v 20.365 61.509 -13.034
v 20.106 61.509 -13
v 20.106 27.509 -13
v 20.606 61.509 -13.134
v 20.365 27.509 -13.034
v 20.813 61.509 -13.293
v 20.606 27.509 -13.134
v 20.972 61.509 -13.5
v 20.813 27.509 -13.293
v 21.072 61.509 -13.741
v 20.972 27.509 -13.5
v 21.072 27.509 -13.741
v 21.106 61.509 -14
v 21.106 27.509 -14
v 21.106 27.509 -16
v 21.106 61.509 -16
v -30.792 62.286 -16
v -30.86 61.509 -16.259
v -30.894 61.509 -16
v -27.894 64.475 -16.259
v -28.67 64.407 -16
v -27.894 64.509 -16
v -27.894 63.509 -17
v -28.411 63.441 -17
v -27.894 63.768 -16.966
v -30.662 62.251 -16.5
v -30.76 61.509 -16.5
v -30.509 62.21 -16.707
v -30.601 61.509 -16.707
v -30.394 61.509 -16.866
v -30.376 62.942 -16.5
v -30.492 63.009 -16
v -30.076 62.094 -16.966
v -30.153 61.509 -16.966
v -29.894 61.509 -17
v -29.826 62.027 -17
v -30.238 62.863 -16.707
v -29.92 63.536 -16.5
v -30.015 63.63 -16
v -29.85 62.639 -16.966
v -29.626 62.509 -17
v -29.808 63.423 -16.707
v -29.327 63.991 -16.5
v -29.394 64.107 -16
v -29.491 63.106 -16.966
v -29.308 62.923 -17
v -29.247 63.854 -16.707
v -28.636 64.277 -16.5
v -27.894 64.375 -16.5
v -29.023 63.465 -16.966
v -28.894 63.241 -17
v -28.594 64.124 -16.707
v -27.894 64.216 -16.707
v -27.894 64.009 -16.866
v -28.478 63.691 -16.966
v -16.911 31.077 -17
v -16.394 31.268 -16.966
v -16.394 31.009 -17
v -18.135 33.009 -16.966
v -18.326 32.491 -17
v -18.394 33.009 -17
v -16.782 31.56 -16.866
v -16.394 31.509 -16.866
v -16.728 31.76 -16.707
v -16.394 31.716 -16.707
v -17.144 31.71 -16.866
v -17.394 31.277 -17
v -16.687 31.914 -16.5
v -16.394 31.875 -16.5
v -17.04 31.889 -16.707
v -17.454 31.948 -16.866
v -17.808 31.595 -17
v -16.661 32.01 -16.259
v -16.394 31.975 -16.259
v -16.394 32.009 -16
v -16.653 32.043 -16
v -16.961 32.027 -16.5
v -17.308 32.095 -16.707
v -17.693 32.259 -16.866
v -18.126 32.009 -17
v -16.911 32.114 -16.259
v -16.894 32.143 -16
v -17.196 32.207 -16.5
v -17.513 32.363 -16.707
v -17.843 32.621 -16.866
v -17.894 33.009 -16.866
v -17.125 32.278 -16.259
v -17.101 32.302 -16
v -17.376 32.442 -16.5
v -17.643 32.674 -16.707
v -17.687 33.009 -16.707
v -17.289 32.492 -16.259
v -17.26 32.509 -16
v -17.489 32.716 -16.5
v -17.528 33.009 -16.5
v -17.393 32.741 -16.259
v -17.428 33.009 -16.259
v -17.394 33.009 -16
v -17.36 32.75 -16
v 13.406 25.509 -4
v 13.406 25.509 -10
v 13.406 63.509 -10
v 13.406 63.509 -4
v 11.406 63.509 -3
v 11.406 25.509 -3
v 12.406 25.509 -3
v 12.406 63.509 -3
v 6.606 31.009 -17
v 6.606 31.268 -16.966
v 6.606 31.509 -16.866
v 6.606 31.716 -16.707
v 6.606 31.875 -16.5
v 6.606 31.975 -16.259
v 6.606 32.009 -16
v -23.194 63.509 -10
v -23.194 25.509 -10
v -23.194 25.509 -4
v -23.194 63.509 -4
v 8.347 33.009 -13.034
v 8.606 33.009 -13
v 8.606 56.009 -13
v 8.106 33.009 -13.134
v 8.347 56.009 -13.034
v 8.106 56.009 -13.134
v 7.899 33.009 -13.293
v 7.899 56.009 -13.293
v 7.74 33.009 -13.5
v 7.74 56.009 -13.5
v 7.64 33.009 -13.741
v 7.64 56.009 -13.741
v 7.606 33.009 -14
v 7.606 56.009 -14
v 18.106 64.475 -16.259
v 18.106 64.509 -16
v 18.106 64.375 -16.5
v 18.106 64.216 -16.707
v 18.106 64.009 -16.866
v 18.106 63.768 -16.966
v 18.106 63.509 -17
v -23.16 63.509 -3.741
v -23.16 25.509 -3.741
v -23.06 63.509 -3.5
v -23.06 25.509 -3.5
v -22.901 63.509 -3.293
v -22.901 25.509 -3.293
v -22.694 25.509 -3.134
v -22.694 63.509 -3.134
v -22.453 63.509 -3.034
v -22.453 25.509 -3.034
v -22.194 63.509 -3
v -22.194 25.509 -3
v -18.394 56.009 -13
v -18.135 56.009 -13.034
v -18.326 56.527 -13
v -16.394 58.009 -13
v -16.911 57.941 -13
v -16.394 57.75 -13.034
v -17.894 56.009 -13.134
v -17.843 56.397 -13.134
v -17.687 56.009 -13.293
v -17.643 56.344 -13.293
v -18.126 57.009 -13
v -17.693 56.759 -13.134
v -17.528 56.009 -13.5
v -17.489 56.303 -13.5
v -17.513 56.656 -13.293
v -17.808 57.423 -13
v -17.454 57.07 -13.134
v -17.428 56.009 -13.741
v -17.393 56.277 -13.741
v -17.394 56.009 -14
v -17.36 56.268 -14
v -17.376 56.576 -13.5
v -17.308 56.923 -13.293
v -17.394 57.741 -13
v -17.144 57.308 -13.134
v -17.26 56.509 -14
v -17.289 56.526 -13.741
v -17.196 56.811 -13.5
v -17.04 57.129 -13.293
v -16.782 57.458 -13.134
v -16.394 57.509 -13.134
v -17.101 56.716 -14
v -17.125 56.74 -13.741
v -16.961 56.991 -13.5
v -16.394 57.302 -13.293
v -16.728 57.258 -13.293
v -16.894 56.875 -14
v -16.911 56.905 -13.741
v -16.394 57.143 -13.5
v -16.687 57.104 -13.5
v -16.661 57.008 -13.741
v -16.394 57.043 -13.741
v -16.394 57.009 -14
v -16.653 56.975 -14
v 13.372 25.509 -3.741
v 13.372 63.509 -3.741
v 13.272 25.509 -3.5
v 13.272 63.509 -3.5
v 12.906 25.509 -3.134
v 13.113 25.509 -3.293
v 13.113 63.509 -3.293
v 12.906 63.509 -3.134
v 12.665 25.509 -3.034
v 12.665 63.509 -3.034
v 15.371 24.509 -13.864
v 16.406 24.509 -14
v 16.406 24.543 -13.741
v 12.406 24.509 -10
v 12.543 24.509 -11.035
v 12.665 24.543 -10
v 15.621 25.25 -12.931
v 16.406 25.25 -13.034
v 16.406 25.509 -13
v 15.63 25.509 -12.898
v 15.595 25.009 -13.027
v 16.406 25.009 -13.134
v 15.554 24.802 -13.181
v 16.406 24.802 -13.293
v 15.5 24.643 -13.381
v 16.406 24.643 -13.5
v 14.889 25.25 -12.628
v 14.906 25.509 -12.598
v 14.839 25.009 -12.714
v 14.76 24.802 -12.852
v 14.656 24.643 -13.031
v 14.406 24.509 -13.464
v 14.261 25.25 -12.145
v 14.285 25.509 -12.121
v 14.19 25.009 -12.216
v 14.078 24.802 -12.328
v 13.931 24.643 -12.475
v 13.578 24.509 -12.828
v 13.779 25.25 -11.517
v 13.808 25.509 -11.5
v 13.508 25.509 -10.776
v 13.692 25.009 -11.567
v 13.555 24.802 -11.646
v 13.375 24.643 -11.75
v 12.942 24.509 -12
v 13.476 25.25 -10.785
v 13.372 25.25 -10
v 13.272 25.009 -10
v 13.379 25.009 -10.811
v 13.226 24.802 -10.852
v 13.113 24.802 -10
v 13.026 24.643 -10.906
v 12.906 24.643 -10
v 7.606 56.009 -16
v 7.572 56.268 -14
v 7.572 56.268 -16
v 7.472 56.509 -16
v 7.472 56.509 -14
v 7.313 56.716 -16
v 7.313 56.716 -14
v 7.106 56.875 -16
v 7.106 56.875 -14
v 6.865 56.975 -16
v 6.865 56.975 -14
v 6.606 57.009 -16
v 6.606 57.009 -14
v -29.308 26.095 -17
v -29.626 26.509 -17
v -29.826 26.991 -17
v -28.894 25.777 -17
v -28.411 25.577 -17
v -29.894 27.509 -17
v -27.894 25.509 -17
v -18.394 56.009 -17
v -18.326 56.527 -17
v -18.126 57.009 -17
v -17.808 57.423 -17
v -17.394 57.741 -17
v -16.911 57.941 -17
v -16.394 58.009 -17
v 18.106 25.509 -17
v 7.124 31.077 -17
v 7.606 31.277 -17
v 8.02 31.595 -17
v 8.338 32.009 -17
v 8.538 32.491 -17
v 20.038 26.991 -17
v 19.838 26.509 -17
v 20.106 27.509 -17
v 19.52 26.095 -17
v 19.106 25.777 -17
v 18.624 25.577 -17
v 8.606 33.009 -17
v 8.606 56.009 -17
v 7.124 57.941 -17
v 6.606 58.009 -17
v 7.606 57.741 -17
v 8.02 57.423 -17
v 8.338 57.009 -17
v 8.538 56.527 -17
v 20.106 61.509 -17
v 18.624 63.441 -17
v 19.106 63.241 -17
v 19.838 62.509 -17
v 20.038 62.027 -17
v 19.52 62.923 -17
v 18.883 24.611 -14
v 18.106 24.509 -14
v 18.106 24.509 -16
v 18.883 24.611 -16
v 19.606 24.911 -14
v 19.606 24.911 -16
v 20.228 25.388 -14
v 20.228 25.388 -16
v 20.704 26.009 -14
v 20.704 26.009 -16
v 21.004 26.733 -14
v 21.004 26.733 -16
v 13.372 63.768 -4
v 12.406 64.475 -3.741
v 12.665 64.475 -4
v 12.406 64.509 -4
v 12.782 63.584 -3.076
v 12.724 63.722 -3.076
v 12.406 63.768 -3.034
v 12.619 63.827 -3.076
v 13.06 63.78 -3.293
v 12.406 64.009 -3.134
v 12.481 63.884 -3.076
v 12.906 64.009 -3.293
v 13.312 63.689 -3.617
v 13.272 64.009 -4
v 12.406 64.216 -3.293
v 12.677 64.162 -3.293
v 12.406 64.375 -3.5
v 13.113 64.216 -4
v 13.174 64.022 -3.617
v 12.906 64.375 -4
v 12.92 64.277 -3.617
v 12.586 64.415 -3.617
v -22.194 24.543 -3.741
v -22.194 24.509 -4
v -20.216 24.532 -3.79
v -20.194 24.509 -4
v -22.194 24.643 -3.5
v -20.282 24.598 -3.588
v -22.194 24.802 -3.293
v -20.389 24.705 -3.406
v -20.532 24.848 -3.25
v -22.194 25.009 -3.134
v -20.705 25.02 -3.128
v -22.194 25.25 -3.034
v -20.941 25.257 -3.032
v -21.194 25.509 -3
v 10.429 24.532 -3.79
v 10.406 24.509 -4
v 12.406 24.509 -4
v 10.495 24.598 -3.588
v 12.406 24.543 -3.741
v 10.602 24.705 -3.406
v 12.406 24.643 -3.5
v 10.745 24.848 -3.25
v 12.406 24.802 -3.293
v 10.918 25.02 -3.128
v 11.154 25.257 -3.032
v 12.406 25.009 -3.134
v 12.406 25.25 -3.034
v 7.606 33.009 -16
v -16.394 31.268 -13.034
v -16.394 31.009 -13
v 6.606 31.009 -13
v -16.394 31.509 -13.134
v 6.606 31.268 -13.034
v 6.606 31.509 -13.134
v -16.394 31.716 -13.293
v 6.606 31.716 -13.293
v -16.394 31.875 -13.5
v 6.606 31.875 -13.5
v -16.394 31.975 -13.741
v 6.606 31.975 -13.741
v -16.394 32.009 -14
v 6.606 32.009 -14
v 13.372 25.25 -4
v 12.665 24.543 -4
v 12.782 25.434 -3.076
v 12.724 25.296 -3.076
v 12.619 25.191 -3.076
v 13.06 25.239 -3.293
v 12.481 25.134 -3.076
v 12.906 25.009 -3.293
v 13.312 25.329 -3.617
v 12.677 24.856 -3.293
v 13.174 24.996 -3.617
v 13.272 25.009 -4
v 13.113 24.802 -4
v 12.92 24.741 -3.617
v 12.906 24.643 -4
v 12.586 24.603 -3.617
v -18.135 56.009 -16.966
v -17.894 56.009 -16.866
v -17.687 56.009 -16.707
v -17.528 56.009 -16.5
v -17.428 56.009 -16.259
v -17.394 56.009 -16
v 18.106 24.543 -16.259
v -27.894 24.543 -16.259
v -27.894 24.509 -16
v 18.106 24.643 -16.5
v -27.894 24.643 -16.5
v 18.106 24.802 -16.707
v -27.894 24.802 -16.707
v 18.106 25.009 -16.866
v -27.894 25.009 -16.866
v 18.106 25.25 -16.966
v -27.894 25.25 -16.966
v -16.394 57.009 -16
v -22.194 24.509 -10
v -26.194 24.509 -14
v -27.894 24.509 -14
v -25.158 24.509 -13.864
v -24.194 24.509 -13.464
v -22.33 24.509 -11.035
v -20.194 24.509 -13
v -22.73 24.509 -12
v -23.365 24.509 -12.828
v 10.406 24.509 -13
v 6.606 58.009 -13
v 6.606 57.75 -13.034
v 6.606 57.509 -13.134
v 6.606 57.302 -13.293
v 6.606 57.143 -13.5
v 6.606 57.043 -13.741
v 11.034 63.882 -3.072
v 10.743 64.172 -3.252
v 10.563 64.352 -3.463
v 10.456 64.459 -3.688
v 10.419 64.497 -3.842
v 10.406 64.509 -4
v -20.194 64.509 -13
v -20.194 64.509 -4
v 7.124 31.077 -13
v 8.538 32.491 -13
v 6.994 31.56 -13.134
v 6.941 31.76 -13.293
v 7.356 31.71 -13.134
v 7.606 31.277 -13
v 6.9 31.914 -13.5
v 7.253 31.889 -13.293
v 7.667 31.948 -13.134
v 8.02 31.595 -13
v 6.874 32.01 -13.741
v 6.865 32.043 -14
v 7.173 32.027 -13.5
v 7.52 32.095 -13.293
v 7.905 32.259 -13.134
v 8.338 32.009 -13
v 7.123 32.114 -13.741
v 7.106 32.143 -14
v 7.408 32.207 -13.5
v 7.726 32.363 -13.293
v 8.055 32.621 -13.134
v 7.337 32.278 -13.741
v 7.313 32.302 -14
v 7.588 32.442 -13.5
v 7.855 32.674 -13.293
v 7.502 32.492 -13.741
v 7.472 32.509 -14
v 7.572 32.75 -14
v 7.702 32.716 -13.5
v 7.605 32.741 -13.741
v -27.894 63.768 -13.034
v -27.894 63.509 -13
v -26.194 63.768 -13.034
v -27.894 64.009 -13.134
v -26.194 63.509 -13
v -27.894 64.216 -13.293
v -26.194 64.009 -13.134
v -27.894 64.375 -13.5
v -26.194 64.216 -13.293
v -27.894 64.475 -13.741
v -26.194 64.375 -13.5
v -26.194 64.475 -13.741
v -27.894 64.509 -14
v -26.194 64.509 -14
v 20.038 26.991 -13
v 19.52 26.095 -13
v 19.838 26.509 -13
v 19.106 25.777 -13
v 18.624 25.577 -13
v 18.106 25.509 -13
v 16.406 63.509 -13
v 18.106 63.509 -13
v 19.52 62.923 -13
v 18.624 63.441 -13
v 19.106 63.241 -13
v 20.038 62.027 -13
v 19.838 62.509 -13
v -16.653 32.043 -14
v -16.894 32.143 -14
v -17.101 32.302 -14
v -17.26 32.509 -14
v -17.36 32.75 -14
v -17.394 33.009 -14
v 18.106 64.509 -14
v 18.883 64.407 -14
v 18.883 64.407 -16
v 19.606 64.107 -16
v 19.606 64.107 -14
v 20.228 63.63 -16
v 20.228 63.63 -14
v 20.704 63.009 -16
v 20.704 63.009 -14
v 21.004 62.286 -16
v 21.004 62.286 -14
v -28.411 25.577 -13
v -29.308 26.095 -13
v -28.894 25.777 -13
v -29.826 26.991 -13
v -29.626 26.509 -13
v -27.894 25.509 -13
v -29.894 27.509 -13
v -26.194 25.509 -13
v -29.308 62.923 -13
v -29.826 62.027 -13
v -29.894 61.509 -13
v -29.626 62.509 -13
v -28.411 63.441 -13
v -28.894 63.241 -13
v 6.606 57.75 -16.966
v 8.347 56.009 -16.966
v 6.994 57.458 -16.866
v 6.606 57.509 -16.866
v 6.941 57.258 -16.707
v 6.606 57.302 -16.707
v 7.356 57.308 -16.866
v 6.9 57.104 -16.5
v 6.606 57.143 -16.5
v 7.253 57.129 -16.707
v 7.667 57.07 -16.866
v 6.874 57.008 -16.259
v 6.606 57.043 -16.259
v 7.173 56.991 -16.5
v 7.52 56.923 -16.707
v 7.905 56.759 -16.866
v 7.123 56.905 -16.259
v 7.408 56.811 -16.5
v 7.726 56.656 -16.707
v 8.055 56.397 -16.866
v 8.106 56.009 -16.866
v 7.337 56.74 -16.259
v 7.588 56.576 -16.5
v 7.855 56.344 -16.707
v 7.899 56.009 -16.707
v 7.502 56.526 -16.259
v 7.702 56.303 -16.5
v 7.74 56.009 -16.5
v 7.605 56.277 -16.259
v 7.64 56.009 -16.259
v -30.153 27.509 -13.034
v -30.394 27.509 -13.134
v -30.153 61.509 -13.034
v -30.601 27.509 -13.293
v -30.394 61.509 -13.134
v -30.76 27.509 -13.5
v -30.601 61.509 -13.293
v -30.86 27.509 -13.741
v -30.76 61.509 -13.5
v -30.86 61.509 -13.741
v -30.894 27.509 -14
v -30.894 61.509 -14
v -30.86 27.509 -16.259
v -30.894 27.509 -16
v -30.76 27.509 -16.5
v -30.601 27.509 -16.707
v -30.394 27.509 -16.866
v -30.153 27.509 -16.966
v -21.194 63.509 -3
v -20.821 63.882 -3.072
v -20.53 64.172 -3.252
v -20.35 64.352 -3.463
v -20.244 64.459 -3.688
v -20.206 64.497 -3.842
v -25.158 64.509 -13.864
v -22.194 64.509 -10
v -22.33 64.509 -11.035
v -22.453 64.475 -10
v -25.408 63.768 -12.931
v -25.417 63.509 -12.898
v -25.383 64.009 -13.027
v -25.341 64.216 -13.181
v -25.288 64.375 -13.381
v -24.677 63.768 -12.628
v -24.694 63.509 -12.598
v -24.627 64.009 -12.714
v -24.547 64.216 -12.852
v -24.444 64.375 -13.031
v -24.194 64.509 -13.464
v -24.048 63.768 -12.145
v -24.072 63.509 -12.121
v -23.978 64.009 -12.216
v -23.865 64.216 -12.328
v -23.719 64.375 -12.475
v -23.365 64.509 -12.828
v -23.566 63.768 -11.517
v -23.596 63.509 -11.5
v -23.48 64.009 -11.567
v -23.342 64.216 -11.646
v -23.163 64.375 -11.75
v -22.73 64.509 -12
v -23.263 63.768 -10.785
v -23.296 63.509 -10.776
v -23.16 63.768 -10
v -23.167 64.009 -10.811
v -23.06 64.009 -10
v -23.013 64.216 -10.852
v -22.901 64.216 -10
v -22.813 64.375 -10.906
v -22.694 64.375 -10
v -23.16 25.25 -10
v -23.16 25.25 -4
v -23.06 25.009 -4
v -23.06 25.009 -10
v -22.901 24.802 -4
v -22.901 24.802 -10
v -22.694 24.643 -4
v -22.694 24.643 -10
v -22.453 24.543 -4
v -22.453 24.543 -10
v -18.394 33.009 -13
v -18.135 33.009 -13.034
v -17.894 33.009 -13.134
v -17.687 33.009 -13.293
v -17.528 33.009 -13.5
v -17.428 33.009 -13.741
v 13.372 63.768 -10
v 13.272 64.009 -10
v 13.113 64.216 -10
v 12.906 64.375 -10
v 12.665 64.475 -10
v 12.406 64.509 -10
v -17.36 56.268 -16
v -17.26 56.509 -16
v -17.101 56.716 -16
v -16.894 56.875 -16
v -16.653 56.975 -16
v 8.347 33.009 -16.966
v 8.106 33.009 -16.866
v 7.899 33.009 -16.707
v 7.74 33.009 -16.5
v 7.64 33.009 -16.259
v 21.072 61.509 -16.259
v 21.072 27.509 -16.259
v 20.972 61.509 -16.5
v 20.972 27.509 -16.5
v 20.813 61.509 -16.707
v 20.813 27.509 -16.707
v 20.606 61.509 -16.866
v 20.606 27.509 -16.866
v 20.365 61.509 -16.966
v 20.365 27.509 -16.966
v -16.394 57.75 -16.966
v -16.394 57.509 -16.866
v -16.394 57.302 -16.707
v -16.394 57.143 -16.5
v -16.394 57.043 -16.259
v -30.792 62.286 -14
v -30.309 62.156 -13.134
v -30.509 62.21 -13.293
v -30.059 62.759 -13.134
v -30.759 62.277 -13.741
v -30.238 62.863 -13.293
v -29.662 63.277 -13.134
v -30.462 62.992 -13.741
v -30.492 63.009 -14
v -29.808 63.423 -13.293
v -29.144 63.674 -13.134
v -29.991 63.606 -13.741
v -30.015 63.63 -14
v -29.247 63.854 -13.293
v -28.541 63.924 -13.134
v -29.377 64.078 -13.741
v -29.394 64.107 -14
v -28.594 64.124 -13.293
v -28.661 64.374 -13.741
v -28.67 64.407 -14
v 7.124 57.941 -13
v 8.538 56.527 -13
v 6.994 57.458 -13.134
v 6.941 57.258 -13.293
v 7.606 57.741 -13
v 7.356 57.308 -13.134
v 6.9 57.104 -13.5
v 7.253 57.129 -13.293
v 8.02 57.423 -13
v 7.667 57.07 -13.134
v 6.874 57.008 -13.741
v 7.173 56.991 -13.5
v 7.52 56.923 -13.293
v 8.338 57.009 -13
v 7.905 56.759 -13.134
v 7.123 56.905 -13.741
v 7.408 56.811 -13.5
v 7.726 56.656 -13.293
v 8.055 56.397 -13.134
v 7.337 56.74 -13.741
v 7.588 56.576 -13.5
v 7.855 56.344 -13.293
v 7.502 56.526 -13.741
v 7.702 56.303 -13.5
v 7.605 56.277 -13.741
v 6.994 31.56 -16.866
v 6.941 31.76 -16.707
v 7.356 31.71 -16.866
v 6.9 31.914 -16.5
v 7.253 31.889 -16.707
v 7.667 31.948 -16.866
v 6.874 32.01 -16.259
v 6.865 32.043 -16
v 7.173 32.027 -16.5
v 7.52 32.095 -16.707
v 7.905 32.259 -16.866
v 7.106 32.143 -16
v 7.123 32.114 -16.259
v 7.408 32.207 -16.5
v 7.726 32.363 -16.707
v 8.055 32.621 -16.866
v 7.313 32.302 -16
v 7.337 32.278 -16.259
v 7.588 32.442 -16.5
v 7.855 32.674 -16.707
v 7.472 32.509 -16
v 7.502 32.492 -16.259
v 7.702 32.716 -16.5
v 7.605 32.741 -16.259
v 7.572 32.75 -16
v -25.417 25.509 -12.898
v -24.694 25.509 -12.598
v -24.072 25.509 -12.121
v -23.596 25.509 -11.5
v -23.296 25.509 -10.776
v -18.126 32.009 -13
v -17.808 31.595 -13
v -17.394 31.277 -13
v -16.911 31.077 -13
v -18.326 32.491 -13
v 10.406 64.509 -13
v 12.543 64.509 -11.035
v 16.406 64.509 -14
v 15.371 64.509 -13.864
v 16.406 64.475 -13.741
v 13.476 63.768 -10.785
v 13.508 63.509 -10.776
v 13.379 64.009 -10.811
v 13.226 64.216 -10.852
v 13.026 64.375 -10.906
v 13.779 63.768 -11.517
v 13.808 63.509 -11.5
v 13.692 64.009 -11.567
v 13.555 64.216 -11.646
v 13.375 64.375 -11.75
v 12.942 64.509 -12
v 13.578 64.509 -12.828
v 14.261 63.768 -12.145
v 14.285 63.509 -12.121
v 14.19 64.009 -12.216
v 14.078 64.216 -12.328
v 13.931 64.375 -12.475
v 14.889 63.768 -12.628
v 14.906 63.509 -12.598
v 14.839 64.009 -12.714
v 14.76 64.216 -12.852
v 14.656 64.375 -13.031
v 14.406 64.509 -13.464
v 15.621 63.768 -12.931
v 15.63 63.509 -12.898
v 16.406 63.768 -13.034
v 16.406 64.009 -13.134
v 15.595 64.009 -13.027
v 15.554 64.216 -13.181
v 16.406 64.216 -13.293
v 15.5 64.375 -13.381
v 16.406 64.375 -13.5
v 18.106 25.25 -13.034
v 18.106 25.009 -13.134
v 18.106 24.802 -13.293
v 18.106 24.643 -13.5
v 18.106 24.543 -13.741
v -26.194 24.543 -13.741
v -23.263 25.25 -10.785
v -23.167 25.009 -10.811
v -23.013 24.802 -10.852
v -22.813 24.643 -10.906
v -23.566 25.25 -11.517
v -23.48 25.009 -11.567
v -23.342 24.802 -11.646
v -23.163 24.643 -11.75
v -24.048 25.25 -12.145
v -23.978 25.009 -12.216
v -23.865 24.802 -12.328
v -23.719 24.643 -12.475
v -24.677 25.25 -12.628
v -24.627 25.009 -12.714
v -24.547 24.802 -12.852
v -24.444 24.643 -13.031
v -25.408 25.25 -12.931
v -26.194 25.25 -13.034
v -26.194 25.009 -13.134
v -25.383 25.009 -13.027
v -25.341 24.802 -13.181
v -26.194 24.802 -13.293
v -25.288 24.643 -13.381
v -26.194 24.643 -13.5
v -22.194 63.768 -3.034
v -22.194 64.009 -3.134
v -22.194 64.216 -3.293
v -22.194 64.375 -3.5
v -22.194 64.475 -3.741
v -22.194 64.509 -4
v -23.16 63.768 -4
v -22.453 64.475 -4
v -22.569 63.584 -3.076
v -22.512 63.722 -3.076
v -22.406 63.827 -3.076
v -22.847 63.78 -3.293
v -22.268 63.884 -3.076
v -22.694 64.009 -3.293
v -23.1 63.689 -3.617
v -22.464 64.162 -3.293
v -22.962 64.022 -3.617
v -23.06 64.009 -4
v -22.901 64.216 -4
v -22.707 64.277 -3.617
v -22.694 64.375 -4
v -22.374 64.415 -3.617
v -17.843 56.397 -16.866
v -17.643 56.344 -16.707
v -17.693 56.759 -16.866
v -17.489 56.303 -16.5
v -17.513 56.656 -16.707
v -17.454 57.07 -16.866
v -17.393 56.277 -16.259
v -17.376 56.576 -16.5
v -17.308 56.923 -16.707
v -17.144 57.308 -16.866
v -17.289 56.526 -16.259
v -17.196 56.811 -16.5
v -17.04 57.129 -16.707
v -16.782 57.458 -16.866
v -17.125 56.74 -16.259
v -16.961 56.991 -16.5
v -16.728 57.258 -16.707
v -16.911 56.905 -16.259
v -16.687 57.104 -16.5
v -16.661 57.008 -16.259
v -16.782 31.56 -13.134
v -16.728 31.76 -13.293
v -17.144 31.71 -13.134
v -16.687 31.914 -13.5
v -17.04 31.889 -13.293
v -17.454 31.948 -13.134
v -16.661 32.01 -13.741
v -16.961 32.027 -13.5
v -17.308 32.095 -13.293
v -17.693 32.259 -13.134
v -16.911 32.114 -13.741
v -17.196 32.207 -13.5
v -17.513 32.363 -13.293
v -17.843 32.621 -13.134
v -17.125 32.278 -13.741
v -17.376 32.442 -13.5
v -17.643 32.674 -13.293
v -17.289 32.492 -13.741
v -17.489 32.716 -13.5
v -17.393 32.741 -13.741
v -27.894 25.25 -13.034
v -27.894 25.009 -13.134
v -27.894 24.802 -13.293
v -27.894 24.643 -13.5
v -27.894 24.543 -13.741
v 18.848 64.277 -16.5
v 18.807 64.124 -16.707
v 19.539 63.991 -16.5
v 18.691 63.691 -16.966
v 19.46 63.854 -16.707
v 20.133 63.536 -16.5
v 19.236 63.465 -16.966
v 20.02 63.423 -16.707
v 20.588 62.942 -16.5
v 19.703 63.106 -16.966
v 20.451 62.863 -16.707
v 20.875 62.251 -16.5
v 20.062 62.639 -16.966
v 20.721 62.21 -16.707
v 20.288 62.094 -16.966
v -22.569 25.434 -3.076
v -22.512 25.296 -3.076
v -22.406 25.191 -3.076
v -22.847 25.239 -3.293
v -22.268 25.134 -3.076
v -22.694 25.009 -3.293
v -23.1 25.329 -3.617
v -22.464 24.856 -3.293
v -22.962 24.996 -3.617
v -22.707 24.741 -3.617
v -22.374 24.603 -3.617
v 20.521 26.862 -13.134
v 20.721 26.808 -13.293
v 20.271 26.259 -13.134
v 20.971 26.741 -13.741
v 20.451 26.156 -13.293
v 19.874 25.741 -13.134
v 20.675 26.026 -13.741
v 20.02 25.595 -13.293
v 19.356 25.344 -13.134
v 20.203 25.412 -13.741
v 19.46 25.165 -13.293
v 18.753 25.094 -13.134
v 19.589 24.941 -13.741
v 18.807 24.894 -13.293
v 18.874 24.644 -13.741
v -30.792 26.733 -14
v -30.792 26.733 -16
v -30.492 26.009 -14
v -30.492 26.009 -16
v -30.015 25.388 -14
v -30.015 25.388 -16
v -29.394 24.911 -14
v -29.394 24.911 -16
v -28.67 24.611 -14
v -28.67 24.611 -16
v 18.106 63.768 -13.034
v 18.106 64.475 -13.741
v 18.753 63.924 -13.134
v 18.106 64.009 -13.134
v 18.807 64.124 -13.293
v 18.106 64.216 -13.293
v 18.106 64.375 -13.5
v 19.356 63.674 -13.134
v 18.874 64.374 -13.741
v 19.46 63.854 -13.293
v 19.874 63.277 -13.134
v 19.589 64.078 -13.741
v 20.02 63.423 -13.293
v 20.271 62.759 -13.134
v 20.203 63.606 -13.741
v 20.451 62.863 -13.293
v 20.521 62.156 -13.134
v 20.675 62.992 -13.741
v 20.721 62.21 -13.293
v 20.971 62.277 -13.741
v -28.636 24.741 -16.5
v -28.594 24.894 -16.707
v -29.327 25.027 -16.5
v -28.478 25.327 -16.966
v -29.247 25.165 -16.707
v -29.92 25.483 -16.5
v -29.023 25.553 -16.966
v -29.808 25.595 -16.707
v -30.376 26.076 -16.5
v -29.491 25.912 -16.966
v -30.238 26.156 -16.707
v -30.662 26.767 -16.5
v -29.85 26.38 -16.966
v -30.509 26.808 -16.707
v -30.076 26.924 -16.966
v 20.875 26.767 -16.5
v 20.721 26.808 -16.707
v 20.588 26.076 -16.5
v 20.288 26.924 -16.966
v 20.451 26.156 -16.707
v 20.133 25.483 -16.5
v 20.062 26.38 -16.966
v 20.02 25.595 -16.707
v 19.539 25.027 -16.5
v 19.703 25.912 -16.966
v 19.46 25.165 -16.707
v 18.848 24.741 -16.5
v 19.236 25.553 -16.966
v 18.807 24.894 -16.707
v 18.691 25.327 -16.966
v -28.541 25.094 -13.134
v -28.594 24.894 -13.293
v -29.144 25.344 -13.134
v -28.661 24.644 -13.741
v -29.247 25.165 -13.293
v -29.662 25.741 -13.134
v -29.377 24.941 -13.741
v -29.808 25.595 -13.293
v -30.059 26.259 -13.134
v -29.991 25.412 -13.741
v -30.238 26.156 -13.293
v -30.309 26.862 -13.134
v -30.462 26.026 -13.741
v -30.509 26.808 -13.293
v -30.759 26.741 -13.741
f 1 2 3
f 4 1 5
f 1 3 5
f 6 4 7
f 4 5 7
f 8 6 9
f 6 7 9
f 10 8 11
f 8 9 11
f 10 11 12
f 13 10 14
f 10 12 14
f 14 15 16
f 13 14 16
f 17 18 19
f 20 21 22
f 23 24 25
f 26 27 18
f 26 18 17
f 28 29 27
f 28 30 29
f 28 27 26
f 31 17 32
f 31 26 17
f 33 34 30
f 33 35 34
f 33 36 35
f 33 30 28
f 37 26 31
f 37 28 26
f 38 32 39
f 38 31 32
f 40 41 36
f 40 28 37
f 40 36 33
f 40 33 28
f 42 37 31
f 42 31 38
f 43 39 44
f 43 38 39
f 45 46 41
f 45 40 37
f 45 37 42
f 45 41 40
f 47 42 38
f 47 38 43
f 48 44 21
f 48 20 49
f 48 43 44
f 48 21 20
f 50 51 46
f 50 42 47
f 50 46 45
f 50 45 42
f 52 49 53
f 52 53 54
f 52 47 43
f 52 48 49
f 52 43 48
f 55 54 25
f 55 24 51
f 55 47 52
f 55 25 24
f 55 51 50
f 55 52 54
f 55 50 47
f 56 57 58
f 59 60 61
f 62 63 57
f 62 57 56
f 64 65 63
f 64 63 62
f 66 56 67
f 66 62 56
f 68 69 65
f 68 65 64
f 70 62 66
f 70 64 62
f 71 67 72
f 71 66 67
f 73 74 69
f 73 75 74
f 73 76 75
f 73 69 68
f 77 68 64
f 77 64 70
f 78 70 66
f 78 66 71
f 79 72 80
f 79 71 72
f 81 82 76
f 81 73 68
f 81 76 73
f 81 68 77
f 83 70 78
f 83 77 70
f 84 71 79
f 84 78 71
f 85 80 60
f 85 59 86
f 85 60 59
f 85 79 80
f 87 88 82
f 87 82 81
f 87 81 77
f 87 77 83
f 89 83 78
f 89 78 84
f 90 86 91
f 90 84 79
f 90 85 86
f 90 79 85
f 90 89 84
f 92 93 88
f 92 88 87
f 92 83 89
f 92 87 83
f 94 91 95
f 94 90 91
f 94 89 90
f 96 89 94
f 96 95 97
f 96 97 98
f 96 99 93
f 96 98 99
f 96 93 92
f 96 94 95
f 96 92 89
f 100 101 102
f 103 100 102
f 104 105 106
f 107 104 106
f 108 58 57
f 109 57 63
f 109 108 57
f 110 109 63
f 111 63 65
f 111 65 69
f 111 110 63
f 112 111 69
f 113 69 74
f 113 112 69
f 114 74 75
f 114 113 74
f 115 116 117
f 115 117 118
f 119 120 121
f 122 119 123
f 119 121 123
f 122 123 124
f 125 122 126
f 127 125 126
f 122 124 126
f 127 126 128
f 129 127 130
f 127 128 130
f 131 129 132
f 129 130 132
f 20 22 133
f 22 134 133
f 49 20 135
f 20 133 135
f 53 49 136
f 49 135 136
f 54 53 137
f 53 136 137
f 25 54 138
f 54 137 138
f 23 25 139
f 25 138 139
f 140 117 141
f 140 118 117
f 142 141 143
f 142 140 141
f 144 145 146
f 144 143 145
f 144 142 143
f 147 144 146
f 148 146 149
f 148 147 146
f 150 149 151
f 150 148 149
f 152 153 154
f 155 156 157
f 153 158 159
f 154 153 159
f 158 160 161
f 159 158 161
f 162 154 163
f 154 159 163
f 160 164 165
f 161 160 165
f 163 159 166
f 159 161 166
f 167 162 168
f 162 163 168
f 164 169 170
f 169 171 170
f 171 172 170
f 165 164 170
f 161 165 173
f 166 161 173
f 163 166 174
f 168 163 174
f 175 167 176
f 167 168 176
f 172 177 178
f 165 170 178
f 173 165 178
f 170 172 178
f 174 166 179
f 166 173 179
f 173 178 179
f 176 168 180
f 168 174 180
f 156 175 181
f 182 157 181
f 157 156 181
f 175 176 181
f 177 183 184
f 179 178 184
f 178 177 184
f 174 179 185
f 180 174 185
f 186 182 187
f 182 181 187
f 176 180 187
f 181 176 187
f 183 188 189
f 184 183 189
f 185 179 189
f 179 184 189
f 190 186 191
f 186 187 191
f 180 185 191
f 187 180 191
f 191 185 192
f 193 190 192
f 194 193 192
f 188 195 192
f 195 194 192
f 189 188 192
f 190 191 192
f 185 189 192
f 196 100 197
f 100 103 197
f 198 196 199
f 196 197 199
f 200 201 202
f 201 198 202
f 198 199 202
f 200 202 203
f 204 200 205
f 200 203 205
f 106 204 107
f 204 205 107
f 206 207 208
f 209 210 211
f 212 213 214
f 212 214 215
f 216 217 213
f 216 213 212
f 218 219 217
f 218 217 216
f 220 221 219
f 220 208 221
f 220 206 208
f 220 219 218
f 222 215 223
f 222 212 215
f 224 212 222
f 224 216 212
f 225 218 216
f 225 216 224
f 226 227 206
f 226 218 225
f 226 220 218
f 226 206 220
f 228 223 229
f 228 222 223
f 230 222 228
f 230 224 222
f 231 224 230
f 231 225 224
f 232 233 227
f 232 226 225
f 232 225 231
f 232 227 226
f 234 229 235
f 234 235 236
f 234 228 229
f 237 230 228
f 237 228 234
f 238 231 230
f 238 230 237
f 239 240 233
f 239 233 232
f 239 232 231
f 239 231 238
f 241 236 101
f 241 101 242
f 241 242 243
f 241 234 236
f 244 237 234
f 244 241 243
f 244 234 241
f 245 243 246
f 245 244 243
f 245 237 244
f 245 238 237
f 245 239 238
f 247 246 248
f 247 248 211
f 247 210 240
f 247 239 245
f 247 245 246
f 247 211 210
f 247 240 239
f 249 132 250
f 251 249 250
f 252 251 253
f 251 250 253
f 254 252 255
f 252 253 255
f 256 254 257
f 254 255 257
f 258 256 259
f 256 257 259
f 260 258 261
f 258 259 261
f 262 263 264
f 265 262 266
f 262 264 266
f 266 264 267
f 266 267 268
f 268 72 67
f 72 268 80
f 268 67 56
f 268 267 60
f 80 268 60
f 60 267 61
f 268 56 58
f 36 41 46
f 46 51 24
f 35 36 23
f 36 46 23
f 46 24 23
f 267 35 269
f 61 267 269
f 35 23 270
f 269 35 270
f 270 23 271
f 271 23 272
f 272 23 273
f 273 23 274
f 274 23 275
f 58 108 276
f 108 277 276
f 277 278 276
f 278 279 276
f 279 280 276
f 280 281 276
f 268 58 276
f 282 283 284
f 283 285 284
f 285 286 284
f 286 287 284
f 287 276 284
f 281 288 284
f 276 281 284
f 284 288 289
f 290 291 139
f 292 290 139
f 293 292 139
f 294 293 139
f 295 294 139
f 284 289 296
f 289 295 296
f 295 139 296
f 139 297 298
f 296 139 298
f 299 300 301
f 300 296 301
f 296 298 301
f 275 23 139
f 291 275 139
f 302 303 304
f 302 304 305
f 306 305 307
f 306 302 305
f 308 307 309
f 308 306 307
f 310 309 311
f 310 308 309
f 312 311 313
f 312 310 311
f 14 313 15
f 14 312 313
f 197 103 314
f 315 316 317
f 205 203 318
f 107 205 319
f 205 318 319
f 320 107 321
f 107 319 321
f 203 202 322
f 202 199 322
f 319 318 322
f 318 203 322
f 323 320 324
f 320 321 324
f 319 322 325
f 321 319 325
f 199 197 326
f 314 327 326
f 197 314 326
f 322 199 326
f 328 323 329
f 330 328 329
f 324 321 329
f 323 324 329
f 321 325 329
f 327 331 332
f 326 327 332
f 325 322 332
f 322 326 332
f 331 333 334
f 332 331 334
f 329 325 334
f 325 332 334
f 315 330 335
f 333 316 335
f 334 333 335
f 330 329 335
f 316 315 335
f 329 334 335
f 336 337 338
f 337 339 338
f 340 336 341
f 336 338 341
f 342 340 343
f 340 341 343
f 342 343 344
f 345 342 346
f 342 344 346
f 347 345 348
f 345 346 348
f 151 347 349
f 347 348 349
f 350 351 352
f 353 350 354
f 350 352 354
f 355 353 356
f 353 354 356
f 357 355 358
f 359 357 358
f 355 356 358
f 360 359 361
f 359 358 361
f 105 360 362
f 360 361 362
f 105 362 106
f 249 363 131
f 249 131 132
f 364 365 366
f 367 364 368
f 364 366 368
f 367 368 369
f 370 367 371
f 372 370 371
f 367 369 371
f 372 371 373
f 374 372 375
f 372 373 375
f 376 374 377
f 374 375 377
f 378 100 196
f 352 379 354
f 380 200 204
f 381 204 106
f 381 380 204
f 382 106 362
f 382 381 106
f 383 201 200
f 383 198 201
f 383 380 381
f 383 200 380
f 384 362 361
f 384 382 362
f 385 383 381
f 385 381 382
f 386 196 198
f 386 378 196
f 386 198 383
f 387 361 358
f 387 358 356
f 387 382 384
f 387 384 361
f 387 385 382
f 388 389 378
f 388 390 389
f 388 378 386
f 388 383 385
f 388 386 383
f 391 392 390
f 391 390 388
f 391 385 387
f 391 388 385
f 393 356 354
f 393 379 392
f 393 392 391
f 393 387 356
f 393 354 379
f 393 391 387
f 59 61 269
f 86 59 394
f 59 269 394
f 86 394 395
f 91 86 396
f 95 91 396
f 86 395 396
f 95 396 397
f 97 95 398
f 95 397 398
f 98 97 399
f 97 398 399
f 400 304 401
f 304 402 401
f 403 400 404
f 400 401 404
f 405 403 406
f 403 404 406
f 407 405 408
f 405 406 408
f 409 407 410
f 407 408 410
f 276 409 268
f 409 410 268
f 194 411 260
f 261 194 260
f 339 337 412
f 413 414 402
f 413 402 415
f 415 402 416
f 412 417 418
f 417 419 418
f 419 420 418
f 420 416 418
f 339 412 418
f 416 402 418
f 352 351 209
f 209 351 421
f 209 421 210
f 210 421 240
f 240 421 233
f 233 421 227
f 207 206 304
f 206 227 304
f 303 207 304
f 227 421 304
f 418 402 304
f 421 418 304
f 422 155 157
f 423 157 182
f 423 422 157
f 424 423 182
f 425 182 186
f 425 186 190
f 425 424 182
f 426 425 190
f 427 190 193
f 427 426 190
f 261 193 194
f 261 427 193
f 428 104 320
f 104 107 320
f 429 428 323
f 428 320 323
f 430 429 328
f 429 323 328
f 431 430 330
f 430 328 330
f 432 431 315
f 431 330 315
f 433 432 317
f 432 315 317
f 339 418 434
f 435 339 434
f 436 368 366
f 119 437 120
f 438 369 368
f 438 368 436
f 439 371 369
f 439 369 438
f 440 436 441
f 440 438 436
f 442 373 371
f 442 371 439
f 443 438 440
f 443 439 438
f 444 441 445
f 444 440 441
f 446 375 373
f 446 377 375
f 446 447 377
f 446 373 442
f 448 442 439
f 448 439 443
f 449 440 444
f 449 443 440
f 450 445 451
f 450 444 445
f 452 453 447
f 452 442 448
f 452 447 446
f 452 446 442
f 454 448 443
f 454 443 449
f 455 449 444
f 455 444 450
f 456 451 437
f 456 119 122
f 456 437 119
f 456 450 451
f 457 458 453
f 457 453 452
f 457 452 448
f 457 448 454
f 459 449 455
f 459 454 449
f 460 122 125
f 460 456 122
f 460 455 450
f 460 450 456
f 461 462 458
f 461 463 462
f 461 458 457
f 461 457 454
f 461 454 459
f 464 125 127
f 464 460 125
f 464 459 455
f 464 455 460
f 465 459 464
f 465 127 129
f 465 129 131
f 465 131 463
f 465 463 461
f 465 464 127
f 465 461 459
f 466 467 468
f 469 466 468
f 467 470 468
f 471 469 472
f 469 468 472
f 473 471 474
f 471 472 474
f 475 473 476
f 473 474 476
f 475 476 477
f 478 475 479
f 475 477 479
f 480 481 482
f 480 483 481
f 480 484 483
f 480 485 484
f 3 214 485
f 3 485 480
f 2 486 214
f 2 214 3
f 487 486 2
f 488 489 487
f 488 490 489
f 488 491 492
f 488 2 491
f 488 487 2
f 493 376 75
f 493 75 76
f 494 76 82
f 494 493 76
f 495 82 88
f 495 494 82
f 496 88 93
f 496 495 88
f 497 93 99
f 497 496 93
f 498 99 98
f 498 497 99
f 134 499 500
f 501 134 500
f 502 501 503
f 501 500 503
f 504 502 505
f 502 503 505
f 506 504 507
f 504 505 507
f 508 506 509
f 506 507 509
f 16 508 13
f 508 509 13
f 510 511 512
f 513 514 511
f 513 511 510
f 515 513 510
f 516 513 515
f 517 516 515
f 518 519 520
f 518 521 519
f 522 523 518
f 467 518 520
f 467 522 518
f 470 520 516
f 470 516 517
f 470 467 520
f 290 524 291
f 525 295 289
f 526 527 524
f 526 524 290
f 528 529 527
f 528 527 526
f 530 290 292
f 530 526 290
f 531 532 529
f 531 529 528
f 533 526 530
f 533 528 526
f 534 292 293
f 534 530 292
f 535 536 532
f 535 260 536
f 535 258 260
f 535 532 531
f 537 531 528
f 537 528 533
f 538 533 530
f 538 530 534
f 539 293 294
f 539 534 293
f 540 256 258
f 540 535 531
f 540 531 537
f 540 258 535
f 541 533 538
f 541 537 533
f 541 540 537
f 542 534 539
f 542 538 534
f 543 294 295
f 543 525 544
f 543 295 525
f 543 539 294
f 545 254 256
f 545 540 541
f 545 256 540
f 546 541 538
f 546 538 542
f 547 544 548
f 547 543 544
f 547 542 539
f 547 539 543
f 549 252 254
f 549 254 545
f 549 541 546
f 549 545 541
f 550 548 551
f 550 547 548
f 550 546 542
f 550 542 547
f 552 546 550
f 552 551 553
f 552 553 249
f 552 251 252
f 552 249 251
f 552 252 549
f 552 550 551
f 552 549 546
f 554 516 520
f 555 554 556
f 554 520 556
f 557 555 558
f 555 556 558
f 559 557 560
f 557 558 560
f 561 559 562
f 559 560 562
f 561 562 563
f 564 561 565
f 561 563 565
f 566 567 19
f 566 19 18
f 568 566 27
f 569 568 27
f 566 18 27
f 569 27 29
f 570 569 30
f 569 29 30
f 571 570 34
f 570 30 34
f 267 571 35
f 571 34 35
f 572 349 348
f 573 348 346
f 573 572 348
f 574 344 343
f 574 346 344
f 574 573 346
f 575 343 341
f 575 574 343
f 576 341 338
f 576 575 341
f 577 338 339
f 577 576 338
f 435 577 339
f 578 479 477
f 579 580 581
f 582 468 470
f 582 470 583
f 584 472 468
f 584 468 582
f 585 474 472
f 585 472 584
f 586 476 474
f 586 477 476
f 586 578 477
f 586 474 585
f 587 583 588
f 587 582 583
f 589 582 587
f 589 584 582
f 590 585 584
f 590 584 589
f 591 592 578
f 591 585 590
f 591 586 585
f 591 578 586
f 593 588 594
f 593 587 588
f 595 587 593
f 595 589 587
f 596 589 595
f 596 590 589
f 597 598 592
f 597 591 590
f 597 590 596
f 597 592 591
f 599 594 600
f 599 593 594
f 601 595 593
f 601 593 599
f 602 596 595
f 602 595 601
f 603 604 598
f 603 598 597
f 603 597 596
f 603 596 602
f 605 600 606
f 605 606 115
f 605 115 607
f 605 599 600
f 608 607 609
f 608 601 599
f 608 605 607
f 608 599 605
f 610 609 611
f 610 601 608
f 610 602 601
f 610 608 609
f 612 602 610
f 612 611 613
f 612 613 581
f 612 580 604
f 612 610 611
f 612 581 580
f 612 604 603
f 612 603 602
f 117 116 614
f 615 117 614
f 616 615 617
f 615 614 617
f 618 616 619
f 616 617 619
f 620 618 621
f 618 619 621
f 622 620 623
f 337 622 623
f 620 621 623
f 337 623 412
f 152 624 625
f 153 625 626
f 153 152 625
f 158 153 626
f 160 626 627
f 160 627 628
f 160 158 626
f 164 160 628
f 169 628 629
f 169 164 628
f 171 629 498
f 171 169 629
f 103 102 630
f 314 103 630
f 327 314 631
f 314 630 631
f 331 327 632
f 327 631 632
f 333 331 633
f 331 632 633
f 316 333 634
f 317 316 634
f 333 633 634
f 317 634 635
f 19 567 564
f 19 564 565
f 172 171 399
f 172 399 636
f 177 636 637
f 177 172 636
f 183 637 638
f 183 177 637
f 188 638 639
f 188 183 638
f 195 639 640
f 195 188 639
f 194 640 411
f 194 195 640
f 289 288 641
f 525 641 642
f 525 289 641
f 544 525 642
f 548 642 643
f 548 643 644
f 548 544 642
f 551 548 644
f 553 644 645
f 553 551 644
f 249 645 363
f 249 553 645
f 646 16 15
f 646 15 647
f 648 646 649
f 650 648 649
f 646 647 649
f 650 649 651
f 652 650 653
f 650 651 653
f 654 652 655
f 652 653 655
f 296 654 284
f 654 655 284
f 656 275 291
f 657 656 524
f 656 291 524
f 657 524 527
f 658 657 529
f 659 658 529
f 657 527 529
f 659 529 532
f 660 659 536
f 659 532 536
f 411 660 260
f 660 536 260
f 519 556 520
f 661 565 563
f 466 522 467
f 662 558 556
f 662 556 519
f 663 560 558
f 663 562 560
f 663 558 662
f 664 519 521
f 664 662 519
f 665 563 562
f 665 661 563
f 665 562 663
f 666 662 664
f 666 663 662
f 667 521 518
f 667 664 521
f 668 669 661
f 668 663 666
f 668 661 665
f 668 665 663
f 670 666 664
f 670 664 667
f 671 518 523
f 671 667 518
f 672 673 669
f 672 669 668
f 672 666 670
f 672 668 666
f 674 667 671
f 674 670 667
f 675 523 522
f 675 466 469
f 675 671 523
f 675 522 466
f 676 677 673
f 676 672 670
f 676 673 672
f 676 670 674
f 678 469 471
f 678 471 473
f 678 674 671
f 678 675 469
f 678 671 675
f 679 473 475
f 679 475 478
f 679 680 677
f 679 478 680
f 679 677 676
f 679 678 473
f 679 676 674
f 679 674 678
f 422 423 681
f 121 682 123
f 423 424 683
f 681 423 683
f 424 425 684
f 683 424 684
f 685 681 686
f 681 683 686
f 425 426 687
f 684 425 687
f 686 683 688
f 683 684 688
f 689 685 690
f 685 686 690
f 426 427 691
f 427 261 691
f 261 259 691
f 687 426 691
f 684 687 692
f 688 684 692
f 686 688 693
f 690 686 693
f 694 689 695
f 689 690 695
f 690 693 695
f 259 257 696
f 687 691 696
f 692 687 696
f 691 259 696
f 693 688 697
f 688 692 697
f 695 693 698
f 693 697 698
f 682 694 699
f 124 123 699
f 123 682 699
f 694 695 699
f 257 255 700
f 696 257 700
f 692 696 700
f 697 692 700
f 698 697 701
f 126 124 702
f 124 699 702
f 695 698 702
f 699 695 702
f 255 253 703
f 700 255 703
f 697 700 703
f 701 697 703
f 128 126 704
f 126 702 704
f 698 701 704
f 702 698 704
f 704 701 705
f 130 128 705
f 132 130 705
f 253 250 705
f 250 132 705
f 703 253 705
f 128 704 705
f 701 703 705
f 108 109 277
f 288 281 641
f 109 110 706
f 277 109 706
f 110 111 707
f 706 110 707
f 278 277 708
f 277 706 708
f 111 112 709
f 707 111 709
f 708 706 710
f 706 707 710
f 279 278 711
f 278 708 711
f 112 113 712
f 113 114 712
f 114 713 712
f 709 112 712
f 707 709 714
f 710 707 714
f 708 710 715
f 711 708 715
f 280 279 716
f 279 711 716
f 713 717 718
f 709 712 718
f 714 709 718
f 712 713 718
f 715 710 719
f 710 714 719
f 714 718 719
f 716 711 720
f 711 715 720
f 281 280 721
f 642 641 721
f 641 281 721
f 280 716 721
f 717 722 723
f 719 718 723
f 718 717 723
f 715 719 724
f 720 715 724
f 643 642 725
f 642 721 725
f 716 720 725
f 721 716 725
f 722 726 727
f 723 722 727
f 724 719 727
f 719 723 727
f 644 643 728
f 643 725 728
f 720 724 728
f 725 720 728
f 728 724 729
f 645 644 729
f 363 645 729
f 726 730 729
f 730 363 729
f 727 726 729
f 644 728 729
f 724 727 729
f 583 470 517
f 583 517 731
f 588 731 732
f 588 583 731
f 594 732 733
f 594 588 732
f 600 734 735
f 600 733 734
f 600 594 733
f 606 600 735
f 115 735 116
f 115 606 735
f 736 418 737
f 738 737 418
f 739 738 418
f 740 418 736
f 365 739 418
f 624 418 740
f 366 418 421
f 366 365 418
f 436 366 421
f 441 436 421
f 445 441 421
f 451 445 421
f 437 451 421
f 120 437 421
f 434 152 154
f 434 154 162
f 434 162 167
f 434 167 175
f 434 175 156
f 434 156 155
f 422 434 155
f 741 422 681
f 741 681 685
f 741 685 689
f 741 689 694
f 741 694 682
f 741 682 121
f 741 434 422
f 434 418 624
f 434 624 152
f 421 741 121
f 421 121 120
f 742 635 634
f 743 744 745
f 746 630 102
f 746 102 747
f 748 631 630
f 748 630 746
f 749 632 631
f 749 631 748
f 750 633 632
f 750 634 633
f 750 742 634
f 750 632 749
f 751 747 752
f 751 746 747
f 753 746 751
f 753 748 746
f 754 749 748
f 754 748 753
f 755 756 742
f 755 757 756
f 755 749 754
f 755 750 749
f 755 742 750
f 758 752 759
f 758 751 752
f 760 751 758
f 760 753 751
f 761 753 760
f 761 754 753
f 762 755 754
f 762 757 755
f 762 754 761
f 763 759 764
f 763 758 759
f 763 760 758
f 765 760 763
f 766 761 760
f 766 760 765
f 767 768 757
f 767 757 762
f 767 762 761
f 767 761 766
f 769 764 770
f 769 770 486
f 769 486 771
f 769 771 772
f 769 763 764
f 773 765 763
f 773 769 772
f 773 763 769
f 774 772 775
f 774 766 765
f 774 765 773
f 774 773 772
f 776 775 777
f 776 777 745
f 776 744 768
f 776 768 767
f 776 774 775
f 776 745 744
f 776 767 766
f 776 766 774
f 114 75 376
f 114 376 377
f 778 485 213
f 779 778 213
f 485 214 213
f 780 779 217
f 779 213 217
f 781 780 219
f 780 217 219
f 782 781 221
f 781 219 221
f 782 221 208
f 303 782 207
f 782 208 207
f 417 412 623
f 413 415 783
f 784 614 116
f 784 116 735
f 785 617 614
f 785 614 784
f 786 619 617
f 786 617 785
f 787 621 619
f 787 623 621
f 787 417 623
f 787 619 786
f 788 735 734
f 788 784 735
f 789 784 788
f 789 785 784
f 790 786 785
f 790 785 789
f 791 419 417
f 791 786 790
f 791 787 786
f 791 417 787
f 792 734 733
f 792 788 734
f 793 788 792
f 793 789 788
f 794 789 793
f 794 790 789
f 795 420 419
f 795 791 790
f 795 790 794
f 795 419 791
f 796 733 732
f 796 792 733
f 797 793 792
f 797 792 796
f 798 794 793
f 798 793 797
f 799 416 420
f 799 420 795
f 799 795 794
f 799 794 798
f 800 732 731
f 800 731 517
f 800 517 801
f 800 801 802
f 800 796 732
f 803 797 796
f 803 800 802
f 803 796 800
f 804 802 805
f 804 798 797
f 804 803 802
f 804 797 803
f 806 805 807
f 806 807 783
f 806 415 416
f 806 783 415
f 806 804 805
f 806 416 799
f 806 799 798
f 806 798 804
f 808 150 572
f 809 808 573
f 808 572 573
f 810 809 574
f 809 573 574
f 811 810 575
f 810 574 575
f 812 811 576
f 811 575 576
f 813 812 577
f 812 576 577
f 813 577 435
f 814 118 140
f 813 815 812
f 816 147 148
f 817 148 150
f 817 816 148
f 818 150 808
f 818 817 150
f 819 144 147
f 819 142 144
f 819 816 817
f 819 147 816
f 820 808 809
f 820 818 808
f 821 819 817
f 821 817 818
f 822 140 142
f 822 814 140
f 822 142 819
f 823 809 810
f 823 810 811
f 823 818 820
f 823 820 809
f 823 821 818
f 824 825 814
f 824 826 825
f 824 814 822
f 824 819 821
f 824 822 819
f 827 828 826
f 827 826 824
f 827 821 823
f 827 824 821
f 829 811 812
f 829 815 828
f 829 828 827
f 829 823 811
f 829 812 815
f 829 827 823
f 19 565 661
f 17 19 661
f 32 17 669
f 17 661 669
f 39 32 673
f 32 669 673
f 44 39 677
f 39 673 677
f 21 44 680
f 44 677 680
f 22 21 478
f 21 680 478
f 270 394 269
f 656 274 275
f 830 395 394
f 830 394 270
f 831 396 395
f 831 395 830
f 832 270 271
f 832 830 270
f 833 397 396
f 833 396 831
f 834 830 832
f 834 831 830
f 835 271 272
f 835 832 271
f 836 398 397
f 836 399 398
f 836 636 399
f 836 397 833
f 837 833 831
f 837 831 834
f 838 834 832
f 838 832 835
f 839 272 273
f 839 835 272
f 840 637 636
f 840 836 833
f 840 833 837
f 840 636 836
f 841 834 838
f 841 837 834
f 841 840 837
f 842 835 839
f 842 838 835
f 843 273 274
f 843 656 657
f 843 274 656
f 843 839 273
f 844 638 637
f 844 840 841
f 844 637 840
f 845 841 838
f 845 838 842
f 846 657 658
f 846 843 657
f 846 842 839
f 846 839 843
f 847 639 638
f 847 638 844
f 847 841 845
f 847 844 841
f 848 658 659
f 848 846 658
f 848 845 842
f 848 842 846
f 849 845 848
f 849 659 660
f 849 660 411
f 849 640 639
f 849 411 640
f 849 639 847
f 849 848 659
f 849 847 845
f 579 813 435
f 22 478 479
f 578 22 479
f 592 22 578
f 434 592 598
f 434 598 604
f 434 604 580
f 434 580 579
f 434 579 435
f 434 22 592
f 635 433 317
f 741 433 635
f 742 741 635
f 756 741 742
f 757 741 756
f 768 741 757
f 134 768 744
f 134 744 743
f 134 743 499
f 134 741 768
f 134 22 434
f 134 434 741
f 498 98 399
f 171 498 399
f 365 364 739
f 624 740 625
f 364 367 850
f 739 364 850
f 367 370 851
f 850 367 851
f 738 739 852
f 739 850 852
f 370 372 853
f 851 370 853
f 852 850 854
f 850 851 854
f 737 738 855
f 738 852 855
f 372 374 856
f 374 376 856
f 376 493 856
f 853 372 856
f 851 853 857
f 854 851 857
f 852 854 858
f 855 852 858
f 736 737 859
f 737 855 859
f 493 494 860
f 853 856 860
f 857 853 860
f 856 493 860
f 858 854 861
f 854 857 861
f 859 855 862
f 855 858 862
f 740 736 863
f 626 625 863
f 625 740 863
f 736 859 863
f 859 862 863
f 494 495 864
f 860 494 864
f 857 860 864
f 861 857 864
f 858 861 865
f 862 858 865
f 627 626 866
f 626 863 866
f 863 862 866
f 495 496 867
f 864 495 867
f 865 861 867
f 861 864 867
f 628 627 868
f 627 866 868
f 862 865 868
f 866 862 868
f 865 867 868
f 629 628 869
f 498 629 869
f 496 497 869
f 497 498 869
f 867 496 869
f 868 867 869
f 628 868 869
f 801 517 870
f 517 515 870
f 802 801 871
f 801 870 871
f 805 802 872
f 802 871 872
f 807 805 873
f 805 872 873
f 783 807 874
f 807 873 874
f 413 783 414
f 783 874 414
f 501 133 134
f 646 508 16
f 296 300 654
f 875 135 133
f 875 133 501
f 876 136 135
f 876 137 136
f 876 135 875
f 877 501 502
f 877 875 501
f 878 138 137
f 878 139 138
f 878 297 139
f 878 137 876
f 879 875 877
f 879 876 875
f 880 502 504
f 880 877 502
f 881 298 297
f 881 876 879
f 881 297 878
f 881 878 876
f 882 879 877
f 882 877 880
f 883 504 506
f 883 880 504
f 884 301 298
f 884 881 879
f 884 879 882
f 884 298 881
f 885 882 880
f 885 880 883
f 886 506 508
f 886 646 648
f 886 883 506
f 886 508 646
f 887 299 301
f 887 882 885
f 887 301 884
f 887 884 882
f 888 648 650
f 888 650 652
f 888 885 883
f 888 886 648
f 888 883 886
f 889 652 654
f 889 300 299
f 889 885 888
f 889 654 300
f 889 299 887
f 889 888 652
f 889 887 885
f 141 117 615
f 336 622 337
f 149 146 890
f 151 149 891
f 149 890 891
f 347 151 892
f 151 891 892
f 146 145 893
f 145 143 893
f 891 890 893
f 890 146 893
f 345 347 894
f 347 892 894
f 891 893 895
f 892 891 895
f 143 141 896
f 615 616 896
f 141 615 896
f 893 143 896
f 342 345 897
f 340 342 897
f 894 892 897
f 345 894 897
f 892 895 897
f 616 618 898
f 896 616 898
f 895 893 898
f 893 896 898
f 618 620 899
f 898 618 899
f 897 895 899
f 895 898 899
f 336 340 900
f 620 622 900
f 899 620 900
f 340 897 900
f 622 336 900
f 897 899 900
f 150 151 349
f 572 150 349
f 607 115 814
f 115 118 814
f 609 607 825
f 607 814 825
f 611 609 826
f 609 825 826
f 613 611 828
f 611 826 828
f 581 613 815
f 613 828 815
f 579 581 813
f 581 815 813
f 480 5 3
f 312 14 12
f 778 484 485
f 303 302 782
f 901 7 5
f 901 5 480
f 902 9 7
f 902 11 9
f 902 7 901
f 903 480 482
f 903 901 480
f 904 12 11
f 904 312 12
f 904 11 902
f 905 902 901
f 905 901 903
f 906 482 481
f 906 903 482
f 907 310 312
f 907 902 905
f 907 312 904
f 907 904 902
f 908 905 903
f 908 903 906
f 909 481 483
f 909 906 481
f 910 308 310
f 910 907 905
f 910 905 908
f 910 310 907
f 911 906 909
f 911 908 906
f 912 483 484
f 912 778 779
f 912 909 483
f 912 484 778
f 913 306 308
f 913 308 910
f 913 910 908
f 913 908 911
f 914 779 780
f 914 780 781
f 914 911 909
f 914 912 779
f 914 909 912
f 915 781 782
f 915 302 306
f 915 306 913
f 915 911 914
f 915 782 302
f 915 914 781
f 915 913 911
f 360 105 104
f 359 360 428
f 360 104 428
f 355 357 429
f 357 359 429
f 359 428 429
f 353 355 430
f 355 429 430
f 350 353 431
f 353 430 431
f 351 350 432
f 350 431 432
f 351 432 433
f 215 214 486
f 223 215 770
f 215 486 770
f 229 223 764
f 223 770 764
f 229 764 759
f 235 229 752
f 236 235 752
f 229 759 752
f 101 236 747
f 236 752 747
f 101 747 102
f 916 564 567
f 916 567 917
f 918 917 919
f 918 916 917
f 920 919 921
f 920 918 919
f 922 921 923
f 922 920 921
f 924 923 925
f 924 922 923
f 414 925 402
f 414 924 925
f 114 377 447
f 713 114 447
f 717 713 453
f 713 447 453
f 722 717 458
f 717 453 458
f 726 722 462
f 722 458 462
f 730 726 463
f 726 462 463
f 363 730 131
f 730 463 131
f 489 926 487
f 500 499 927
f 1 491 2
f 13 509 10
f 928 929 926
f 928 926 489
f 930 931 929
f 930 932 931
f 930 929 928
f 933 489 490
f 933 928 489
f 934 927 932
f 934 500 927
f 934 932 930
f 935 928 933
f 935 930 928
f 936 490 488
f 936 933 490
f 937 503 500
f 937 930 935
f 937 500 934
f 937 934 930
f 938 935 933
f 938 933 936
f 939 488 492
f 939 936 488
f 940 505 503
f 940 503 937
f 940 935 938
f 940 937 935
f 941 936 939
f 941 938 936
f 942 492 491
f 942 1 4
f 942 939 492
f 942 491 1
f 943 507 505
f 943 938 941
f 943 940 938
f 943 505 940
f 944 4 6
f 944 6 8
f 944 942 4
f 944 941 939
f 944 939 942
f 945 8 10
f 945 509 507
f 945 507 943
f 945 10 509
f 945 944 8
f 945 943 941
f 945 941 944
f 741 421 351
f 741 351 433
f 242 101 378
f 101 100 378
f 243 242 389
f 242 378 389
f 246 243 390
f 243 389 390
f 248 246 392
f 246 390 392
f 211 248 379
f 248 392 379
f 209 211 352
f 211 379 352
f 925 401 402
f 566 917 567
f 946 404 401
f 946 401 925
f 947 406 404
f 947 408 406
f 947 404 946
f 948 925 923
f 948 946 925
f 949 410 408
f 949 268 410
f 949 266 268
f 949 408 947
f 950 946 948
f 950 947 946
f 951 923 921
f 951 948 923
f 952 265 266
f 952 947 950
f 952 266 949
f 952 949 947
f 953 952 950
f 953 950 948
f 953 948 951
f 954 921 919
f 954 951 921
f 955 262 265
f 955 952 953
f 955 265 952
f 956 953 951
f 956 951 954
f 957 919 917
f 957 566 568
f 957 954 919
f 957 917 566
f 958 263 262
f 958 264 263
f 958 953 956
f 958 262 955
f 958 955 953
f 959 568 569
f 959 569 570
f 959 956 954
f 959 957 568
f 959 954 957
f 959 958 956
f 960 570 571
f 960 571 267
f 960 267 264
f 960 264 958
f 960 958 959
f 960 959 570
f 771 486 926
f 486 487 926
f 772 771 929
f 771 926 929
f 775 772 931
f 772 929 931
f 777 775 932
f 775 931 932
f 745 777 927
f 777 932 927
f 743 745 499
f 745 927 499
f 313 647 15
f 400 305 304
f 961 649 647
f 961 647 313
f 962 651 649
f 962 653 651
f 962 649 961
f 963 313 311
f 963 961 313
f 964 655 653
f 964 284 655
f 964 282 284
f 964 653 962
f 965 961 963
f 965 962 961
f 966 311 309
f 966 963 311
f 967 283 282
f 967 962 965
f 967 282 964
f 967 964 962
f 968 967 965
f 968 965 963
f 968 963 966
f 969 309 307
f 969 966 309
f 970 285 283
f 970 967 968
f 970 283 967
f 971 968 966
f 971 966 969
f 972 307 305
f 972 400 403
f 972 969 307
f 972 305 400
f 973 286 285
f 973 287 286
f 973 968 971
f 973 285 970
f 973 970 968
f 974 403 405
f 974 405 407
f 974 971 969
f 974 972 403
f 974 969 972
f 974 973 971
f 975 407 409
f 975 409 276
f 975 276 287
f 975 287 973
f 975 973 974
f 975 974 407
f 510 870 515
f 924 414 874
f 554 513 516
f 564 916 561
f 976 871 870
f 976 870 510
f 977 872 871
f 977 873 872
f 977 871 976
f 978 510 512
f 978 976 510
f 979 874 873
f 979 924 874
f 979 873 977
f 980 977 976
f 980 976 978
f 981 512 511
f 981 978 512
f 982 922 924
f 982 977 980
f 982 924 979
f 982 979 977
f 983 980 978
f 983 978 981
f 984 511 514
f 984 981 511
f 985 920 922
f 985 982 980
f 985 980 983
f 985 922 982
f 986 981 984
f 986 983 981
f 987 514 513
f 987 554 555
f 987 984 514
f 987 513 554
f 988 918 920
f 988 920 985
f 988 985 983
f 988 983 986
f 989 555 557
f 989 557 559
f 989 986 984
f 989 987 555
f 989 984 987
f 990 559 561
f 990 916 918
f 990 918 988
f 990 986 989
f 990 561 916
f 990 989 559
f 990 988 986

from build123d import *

# Parameters (mm, degrees)
SKETCH024_W   = 52
SKETCH024_H   = 40
SKETCH024_W_2 = 25
SKETCH024_H_2 = 25
PAD011_DEPTH  = 4
SKETCH025_W   = 3
SKETCH025_H   = 40
PAD012_DEPTH  = 10
FILLET010_R   = 3
FILLET011_R   = 3
FILLET012_R   = 1
FILLET013_R   = 1
FILLET014_R   = 1


with BuildPart() as part:
    # Sketch024 → Pad011 (new body)
    with BuildSketch(Plane.XY):
        with Locations((-4.893746, 41.509103)):
            Rectangle(SKETCH024_W, SKETCH024_H)
        with Locations((-4.893746, 41.509103)):
            Rectangle(SKETCH024_W_2, SKETCH024_H_2, mode=Mode.SUBTRACT)
    extrude(amount=PAD011_DEPTH)

    # Sketch025 → Pad012 (join)
    with BuildSketch(Plane.XY.offset(4)):
        with Locations((-21.693746, 41.509103)):
            Rectangle(SKETCH025_W, SKETCH025_H)
        with Locations((11.906254, 41.509103)):
            Rectangle(SKETCH025_W, SKETCH025_H)
    extrude(amount=PAD012_DEPTH)

    # Fillet010
    fillet010_edges = [part.edges().sort_by_distance(p)[0] for p in [
        (21.106254, 21.509103, 2),
        (21.106254, 61.509103, 2),
        (-30.893746, 61.509103, 2),
        (-30.893746, 21.509103, 2),
    ]]
    fillet(fillet010_edges, radius=FILLET010_R)

    # Fillet011
    fillet011_edges = [part.edges().sort_by_distance(p)[0] for p in [
        (-23.193746, 41.509103, 4),
        (13.406254, 41.509103, 4),
    ]]
    fillet(fillet011_edges, radius=FILLET011_R)

    # Fillet012
    fillet012_edges = [part.edges().sort_by_distance(p)[0] for p in [
        (-4.893746, 61.509103, 0),
    ]]
    fillet(fillet012_edges, radius=FILLET012_R)

    # Fillet013
    fillet013_edges = [part.edges().sort_by_distance(p)[0] for p in [
        (20.227575, 60.630424, 4),
        (13.406254, 41.509103, 14),
        (-24.072425, 61.509103, 4.87868),
        (-23.193746, 41.509103, 14),
        (11.906254, 61.509103, 14),
        (11.906254, 21.509103, 14),
        (-21.693746, 21.509103, 14),
        (-21.693746, 61.509103, 14),
        (-20.193746, 41.509103, 14),
        (10.406254, 41.509103, 14),
    ]]
    fillet(fillet013_edges, radius=FILLET013_R)

    # Fillet014
    fillet014_edges = [part.edges().sort_by_distance(p)[0] for p in [
        (7.606254, 29.009103, 2),
        (-17.393746, 29.009103, 2),
        (-4.893746, 29.009103, 0),
        (-4.893746, 29.009103, 4),
        (-17.393746, 54.009103, 2),
        (-17.393746, 41.509103, 0),
        (-17.393746, 41.509103, 4),
        (7.606254, 54.009103, 2),
        (-4.893746, 54.009103, 0),
        (-4.893746, 54.009103, 4),
        (7.606254, 41.509103, 0),
        (7.606254, 41.509103, 4),
    ]]
    fillet(fillet014_edges, radius=FILLET014_R)


with BuildPart() as part_1:
    # Body005 placement: moved
    add(part.part.moved(Location((0, 3, -17))))


solid = part_1.part
